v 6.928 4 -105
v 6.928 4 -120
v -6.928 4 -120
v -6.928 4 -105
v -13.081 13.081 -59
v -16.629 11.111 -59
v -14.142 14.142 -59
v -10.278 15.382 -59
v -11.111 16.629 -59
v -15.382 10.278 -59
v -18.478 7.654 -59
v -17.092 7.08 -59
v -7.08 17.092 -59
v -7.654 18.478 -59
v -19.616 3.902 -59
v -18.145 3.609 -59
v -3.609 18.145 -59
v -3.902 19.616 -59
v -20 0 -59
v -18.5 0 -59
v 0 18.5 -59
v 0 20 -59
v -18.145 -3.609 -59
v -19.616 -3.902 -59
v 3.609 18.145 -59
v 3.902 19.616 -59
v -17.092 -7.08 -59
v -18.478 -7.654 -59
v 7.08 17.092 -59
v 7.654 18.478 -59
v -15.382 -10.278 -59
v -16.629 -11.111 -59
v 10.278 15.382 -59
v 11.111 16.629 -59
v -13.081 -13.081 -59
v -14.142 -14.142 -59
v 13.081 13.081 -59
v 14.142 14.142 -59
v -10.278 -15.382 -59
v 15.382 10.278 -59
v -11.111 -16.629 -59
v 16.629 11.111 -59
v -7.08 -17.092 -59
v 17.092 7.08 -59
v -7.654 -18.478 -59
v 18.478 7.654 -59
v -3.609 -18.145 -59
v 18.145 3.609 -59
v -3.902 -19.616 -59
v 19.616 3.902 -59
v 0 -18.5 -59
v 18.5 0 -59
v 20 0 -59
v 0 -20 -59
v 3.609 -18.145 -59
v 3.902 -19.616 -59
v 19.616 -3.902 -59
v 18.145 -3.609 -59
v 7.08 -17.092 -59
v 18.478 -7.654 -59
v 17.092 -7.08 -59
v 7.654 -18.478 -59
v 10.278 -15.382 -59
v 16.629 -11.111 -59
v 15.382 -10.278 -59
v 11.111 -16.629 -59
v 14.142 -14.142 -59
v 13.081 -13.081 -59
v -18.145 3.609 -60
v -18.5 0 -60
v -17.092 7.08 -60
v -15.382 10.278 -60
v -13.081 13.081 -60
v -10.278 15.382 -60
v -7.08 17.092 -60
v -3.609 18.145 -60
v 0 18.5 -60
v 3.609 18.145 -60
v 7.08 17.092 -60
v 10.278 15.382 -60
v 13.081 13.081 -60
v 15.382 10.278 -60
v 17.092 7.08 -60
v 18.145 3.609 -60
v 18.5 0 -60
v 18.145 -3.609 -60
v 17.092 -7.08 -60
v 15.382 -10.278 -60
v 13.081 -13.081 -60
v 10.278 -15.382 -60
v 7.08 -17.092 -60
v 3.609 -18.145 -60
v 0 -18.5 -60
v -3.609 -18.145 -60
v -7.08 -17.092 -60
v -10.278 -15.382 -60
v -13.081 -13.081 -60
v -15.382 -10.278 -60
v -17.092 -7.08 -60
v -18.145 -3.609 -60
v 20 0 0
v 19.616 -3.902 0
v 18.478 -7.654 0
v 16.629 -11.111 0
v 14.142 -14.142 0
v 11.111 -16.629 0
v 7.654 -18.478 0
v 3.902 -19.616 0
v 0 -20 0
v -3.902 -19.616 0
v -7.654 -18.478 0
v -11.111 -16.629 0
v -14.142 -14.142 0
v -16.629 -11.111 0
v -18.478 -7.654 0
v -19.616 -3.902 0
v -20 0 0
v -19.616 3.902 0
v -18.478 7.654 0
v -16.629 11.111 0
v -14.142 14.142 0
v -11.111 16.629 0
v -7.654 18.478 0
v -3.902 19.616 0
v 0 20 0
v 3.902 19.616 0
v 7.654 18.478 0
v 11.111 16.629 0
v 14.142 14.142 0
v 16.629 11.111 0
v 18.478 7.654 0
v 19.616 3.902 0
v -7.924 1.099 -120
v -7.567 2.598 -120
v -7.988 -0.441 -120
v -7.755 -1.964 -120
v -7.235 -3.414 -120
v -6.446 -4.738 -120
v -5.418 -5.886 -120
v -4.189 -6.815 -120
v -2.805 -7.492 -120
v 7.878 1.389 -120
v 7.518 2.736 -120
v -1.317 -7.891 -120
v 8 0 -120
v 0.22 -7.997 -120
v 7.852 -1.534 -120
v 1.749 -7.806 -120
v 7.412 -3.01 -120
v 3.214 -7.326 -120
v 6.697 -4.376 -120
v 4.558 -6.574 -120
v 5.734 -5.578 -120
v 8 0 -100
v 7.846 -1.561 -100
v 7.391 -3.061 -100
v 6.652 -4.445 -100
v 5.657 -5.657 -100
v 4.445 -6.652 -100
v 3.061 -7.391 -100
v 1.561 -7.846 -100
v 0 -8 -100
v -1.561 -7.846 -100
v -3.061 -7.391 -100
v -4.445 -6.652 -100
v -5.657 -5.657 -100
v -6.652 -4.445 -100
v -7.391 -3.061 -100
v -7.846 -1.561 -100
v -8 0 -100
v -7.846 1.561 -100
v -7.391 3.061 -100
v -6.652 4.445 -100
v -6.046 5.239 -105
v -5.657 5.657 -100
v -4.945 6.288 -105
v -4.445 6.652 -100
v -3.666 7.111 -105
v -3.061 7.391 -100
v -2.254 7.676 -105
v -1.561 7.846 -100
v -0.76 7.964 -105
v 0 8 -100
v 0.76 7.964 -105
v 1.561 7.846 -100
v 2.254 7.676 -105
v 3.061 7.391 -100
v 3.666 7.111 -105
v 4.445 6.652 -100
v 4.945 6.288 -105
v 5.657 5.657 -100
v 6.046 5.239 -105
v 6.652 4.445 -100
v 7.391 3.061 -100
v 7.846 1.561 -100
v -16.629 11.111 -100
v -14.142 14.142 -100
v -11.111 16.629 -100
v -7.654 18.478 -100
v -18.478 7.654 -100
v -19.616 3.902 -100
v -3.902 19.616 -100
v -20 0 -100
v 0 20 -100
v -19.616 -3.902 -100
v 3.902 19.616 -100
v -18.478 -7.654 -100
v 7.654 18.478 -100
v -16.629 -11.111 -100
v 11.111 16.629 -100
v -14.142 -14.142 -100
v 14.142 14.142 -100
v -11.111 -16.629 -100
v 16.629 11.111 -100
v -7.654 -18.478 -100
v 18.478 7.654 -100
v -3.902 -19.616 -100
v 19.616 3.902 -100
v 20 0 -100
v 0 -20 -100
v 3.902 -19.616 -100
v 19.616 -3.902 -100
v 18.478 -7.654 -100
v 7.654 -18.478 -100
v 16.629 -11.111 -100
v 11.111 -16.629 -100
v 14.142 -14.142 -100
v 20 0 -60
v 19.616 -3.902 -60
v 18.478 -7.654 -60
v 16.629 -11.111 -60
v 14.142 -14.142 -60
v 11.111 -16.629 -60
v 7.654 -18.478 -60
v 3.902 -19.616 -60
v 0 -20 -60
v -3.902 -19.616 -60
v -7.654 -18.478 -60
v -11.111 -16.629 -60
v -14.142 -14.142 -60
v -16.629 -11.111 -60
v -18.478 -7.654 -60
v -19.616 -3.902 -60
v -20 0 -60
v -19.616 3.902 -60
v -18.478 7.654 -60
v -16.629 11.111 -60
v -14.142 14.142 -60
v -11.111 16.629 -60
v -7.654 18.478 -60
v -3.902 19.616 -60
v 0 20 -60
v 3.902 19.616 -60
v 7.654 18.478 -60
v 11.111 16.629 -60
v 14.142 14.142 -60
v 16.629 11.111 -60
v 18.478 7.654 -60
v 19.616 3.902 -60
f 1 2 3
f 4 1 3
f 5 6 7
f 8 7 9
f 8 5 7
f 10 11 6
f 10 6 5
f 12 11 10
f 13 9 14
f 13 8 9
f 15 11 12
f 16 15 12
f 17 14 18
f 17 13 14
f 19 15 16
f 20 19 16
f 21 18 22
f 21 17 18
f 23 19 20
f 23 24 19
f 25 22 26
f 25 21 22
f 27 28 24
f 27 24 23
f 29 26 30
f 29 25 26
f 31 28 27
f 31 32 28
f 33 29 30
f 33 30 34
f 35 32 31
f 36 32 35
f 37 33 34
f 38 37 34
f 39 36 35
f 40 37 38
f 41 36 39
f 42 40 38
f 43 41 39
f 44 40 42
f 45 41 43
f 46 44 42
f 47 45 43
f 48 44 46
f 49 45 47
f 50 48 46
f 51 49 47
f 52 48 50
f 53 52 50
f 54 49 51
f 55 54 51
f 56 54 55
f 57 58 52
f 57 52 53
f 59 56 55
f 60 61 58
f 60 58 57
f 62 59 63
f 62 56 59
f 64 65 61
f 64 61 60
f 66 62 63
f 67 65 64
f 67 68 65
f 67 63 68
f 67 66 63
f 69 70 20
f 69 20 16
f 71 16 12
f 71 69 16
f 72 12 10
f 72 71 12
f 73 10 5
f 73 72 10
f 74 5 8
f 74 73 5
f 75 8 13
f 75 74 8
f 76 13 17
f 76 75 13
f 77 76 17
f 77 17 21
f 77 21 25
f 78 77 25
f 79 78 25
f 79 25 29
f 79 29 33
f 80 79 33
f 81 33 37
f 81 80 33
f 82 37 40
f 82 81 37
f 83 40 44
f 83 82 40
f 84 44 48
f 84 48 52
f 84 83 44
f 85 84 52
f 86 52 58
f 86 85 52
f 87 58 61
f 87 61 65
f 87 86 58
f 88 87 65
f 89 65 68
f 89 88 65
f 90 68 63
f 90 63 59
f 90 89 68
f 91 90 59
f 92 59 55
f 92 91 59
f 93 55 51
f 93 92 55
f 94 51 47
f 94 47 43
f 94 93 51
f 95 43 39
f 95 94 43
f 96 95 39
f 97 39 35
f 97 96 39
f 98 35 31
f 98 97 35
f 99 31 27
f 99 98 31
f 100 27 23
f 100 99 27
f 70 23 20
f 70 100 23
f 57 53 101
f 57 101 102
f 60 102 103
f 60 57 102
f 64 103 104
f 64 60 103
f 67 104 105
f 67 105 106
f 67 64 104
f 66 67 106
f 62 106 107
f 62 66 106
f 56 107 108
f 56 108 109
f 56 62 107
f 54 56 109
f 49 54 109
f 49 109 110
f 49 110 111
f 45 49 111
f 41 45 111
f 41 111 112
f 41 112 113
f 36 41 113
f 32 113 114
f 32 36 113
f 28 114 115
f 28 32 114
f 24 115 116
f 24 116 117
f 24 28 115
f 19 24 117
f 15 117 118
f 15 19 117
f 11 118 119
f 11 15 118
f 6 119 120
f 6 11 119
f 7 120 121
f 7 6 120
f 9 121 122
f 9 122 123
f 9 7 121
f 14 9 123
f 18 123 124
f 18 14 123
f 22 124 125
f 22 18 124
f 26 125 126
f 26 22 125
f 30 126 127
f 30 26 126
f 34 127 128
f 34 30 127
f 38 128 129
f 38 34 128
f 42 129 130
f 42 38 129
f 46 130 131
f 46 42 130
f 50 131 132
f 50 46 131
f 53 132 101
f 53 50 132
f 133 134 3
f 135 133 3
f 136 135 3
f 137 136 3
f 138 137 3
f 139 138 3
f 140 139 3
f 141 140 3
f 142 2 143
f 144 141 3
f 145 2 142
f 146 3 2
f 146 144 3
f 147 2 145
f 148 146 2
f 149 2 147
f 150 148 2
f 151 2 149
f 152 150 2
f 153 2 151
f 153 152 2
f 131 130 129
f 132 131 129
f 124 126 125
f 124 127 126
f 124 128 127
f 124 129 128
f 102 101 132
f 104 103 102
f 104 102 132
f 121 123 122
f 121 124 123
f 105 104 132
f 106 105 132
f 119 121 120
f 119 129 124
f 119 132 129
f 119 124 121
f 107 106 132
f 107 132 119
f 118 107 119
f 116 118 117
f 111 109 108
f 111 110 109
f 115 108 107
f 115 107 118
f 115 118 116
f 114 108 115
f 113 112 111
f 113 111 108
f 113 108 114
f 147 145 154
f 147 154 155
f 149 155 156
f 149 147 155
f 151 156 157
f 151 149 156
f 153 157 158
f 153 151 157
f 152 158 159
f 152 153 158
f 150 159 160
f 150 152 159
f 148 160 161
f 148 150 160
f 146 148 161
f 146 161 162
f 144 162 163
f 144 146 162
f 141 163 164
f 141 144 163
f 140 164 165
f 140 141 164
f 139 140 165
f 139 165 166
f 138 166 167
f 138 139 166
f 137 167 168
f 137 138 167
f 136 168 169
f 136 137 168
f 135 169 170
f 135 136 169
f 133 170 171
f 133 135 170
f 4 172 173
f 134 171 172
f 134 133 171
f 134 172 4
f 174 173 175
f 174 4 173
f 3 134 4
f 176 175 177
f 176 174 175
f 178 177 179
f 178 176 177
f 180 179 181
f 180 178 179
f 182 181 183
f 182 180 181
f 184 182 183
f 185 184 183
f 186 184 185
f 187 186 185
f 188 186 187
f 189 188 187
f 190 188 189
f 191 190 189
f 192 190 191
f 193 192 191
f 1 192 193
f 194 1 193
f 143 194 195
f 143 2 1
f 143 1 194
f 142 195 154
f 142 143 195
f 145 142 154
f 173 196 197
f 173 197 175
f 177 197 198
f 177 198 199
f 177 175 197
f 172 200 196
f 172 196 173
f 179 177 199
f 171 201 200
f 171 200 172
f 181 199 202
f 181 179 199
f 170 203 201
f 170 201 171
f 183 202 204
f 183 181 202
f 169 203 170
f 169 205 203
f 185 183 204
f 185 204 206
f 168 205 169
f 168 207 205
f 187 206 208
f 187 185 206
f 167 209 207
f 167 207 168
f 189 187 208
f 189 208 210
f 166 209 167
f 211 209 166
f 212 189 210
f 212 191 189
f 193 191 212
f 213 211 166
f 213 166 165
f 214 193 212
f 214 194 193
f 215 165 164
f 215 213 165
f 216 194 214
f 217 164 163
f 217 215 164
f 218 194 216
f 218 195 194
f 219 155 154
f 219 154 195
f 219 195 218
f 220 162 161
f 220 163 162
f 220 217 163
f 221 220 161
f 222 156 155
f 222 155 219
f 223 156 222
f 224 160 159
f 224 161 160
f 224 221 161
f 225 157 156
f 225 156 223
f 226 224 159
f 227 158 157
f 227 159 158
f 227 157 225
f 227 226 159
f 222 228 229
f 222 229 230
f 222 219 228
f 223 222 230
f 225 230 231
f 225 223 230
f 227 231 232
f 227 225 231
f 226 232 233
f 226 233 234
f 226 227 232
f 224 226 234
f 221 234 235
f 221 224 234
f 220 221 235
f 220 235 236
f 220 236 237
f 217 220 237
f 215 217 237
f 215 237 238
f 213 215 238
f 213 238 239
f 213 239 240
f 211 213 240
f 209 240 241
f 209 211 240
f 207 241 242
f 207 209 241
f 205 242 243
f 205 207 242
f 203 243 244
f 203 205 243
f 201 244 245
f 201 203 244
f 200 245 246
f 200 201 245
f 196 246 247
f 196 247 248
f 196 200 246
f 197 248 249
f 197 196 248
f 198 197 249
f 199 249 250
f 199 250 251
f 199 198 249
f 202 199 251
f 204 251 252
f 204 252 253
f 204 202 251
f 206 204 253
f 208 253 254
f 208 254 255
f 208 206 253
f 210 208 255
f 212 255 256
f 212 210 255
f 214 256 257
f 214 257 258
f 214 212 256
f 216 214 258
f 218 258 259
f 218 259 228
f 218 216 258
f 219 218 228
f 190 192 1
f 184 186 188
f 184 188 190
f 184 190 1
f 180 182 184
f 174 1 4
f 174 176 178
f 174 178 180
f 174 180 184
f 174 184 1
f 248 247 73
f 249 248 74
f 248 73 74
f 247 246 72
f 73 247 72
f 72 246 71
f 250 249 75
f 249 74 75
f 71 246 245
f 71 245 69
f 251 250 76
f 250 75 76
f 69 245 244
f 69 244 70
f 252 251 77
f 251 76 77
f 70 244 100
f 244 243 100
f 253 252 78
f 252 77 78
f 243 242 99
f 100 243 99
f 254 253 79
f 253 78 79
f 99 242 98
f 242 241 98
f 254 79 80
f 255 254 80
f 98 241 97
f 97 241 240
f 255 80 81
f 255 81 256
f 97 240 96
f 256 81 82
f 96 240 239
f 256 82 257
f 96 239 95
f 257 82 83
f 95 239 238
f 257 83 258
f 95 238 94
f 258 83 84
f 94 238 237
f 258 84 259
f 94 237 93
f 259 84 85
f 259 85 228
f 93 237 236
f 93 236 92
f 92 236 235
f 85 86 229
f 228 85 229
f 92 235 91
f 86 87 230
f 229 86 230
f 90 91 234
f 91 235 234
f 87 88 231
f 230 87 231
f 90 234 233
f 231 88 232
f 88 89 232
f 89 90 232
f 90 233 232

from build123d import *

# Parameters (mm, degrees)
CUT_EXTRUDE1_DEPTH = 15
CUT_EXTRUDE2_START = -40
SKETCH3_R          = 20
SKETCH3_R_2        = 18.5
CUT_EXTRUDE2_DEPTH = 1


with BuildPart() as part:
    # Sketch1 → Revolve1 (revolve)
    with BuildSketch(Plane(origin=(0, 0, 0), x_dir=(0, 0, -1), z_dir=(1, 0, 0)), mode=Mode.PRIVATE) as revolve1_sk:
        Polygon((0, 0), (0, 20), (100, 20), (100, 8), (120, 8), (120, 0), align=None)
    revolve(revolve1_sk.sketch.rotate(Axis((0, 0, 24.465289117), (0, 0, -1)), 90), axis=Axis((0, 0, 24.465289117), (0, 0, -1)))

    # Sketch2 → Cut-Extrude1 (cut)
    with BuildSketch(Plane(origin=(0, 0, -120), x_dir=(-1, 0, 0), z_dir=(0, 0, -1))):
        with BuildLine():
            Line((-6.92820323, 4), (6.92820323, 4))
            ThreePointArc((6.92820323, 4), (0, 8), (-6.92820323, 4))
        make_face()
    extrude(amount=-CUT_EXTRUDE1_DEPTH, mode=Mode.SUBTRACT)

    # Sketch3 → Cut-Extrude2 (cut)
    with BuildSketch(Plane(origin=(0, 0, -100), x_dir=(-1, 0, 0), z_dir=(0, 0, -1)).offset(CUT_EXTRUDE2_START)):
        with Locations(Location((0, 0, 0), (0, 0, 180))):
            Circle(SKETCH3_R)
        Circle(SKETCH3_R_2, mode=Mode.SUBTRACT)
    extrude(amount=-CUT_EXTRUDE2_DEPTH, mode=Mode.SUBTRACT)


solid = part.part
